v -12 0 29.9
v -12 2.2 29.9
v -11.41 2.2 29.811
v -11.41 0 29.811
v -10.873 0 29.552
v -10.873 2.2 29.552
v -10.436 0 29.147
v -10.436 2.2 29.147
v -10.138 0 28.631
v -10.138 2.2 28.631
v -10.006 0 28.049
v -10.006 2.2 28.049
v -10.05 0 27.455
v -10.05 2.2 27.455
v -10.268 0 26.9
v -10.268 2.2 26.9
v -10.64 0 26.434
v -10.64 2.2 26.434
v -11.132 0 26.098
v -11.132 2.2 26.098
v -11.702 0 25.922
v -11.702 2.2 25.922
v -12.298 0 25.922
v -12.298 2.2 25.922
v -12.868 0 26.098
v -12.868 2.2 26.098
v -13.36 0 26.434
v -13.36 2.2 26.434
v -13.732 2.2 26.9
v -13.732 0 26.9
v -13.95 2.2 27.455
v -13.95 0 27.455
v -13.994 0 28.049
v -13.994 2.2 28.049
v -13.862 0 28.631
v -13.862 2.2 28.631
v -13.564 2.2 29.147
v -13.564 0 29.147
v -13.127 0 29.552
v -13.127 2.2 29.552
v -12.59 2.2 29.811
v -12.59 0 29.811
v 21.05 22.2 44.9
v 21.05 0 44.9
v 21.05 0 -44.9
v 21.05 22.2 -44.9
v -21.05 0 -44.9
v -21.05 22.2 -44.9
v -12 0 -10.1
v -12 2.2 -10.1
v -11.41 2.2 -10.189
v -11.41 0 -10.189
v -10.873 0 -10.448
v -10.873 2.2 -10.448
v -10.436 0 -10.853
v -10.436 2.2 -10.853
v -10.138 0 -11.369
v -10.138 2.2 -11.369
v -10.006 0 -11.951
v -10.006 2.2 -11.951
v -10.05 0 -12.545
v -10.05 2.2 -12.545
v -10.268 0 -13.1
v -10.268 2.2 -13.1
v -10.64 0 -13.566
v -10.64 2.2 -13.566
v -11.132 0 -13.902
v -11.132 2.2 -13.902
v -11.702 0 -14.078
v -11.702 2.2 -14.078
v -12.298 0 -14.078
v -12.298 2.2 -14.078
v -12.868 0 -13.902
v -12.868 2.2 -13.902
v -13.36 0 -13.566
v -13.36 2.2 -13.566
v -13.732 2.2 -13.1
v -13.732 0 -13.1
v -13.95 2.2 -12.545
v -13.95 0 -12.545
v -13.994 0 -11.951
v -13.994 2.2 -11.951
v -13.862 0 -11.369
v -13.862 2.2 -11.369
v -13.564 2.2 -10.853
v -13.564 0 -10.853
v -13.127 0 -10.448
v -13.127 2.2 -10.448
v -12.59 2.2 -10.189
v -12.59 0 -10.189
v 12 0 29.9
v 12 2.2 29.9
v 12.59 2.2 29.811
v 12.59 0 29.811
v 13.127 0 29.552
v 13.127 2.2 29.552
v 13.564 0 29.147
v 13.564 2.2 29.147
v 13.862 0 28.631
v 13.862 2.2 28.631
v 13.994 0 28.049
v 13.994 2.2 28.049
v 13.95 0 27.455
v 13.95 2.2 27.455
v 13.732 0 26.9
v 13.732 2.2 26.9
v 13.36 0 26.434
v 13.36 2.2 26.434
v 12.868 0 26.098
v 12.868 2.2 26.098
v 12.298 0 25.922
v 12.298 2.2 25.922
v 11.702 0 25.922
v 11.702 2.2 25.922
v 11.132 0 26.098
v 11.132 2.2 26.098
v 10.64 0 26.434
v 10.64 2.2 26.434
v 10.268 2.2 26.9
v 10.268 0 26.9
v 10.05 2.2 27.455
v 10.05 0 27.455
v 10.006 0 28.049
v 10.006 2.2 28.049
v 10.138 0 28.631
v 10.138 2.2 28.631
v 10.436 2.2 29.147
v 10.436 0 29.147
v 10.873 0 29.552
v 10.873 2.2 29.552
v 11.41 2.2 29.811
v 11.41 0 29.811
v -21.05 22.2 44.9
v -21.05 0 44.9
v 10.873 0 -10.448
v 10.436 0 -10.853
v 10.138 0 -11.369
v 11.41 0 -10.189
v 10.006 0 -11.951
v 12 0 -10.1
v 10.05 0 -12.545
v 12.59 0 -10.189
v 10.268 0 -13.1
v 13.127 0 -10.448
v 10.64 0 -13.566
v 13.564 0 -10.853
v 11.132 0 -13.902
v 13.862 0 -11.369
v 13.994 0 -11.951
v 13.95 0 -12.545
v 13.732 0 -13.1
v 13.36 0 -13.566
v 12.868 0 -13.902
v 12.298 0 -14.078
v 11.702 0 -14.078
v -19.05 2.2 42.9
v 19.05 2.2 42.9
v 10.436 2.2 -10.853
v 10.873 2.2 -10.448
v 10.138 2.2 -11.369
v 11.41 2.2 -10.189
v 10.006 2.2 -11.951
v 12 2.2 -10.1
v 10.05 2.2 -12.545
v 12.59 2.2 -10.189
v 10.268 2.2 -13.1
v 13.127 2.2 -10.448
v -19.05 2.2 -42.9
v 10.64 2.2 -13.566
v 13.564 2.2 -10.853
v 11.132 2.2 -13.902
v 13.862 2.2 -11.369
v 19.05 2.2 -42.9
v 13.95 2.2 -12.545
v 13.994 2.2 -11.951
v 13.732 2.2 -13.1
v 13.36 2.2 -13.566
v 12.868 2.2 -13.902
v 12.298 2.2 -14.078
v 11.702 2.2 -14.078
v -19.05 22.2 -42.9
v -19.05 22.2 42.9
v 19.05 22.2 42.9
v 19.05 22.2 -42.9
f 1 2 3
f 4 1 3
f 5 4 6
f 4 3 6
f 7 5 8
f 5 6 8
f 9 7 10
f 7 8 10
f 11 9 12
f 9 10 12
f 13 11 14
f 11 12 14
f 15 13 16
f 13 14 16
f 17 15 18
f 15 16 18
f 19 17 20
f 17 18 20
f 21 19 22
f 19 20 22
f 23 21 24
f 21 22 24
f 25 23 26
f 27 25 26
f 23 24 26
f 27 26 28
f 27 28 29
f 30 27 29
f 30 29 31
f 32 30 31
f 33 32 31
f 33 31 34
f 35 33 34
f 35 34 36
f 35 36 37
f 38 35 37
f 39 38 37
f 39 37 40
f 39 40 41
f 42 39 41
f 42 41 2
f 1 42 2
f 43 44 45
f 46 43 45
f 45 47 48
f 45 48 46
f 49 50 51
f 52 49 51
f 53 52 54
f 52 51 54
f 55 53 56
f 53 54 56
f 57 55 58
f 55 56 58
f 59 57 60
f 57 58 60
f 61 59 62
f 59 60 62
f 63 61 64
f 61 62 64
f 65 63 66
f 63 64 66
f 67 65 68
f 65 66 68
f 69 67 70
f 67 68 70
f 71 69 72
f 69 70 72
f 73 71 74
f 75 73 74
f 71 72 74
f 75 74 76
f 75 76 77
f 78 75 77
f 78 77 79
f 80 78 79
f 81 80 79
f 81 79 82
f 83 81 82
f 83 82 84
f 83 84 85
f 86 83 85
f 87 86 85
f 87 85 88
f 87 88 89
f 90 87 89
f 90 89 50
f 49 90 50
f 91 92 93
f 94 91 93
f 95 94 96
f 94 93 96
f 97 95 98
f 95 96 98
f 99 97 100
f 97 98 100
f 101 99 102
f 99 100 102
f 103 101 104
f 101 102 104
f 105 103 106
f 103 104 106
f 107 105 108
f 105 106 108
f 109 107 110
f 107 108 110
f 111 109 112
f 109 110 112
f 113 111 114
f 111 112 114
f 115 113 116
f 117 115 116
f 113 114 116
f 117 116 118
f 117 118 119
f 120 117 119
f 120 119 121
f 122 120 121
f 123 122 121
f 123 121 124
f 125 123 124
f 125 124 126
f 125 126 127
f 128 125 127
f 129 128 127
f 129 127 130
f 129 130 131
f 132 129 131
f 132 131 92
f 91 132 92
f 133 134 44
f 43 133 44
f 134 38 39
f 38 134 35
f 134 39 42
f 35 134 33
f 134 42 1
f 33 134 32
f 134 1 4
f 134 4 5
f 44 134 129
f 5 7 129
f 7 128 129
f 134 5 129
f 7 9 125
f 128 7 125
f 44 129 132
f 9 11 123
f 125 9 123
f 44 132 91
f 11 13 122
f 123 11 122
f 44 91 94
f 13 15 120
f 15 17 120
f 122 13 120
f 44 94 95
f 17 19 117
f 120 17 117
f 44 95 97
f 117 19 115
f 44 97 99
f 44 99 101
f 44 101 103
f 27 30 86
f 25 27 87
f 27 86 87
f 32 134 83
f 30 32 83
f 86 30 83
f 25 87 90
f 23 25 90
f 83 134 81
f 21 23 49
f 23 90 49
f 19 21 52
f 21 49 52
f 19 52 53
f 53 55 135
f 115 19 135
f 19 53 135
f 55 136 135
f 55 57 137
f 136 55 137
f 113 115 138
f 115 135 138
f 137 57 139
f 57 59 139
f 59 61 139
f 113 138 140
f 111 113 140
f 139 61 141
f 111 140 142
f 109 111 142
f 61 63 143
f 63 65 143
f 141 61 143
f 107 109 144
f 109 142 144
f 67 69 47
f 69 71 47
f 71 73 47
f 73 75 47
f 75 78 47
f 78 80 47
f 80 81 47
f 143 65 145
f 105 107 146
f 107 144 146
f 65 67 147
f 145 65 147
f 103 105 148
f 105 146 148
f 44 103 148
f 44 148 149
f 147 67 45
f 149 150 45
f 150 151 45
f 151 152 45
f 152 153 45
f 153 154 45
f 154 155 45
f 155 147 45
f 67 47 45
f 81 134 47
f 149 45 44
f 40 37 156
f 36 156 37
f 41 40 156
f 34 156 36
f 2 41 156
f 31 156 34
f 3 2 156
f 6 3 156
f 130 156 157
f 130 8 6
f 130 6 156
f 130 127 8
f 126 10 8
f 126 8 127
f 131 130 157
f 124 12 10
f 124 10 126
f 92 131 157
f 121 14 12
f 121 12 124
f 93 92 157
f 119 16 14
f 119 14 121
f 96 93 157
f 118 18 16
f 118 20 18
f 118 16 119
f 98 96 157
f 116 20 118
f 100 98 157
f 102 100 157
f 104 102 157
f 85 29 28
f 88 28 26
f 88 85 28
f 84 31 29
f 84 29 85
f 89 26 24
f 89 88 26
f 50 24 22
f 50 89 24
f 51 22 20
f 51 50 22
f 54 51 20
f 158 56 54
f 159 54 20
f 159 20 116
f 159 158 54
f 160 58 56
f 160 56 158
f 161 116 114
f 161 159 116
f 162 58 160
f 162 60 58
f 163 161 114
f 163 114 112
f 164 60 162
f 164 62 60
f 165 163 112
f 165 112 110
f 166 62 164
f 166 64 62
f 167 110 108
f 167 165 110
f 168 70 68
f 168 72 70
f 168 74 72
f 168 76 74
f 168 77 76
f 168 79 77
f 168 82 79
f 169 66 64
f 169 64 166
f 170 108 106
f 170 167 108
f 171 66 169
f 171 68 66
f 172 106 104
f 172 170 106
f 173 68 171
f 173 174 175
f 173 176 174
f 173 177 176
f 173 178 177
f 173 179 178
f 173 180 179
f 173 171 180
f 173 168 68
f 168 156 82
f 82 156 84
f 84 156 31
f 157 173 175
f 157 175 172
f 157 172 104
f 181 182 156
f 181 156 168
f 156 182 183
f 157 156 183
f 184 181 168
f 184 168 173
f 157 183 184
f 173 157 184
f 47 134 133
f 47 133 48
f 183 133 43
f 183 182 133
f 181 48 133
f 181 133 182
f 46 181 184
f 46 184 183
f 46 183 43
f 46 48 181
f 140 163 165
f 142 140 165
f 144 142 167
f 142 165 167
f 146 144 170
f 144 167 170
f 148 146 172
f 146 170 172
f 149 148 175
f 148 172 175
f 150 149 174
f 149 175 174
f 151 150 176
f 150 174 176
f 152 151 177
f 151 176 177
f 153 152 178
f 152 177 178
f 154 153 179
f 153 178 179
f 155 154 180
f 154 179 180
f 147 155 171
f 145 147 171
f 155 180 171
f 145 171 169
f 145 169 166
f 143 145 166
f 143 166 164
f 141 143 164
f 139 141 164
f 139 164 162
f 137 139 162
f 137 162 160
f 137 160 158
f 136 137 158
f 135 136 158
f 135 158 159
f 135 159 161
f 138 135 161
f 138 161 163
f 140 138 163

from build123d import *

# Parameters (mm, degrees)
SKETCH_1_W          = 42.1
SKETCH_1_H          = 89.8
EXTRUDE_1_DEPTH     = 22.2
SKETCH_2_W          = 38.1
SKETCH_2_H          = 85.8
CUT_EXTRUDE_1_DEPTH = 20
SKETCH_3_R          = 2
CUT_EXTRUDE_2_DEPTH = 54.47066953


with BuildPart() as part:
    # 스케치1 → 보스-돌출1 (new body)
    with BuildSketch(Plane(origin=(0, 0, 0), x_dir=(1, 0, 0), z_dir=(0, 1, 0))):
        Rectangle(SKETCH_1_W, SKETCH_1_H)
    extrude(amount=EXTRUDE_1_DEPTH)

    # 스케치2 → 컷-돌출1 (cut)
    with BuildSketch(Plane(origin=(0, 22.2, 0), x_dir=(1, 0, 0), z_dir=(0, 1, 0))):
        Rectangle(SKETCH_2_W, SKETCH_2_H)
    extrude(amount=-CUT_EXTRUDE_1_DEPTH, mode=Mode.SUBTRACT)

    # 스케치3 → 컷-돌출2 (cut, through all)
    with BuildSketch(Plane(origin=(0, 2.2, 0), x_dir=(1, 0, 0), z_dir=(0, 1, 0))):
        with Locations(Location((-12, -27.9, 0), (0, 0, 270))):
            Circle(SKETCH_3_R)
        with Locations(Location((-12, 12.1, 0), (0, 0, 270))):
            Circle(SKETCH_3_R)
        with Locations(Location((12, 12.1, 0), (0, 0, 270))):
            Circle(SKETCH_3_R)
        with Locations(Location((12, -27.9, 0), (0, 0, 270))):
            Circle(SKETCH_3_R)
    extrude(amount=-CUT_EXTRUDE_2_DEPTH, mode=Mode.SUBTRACT)


solid = part.part
